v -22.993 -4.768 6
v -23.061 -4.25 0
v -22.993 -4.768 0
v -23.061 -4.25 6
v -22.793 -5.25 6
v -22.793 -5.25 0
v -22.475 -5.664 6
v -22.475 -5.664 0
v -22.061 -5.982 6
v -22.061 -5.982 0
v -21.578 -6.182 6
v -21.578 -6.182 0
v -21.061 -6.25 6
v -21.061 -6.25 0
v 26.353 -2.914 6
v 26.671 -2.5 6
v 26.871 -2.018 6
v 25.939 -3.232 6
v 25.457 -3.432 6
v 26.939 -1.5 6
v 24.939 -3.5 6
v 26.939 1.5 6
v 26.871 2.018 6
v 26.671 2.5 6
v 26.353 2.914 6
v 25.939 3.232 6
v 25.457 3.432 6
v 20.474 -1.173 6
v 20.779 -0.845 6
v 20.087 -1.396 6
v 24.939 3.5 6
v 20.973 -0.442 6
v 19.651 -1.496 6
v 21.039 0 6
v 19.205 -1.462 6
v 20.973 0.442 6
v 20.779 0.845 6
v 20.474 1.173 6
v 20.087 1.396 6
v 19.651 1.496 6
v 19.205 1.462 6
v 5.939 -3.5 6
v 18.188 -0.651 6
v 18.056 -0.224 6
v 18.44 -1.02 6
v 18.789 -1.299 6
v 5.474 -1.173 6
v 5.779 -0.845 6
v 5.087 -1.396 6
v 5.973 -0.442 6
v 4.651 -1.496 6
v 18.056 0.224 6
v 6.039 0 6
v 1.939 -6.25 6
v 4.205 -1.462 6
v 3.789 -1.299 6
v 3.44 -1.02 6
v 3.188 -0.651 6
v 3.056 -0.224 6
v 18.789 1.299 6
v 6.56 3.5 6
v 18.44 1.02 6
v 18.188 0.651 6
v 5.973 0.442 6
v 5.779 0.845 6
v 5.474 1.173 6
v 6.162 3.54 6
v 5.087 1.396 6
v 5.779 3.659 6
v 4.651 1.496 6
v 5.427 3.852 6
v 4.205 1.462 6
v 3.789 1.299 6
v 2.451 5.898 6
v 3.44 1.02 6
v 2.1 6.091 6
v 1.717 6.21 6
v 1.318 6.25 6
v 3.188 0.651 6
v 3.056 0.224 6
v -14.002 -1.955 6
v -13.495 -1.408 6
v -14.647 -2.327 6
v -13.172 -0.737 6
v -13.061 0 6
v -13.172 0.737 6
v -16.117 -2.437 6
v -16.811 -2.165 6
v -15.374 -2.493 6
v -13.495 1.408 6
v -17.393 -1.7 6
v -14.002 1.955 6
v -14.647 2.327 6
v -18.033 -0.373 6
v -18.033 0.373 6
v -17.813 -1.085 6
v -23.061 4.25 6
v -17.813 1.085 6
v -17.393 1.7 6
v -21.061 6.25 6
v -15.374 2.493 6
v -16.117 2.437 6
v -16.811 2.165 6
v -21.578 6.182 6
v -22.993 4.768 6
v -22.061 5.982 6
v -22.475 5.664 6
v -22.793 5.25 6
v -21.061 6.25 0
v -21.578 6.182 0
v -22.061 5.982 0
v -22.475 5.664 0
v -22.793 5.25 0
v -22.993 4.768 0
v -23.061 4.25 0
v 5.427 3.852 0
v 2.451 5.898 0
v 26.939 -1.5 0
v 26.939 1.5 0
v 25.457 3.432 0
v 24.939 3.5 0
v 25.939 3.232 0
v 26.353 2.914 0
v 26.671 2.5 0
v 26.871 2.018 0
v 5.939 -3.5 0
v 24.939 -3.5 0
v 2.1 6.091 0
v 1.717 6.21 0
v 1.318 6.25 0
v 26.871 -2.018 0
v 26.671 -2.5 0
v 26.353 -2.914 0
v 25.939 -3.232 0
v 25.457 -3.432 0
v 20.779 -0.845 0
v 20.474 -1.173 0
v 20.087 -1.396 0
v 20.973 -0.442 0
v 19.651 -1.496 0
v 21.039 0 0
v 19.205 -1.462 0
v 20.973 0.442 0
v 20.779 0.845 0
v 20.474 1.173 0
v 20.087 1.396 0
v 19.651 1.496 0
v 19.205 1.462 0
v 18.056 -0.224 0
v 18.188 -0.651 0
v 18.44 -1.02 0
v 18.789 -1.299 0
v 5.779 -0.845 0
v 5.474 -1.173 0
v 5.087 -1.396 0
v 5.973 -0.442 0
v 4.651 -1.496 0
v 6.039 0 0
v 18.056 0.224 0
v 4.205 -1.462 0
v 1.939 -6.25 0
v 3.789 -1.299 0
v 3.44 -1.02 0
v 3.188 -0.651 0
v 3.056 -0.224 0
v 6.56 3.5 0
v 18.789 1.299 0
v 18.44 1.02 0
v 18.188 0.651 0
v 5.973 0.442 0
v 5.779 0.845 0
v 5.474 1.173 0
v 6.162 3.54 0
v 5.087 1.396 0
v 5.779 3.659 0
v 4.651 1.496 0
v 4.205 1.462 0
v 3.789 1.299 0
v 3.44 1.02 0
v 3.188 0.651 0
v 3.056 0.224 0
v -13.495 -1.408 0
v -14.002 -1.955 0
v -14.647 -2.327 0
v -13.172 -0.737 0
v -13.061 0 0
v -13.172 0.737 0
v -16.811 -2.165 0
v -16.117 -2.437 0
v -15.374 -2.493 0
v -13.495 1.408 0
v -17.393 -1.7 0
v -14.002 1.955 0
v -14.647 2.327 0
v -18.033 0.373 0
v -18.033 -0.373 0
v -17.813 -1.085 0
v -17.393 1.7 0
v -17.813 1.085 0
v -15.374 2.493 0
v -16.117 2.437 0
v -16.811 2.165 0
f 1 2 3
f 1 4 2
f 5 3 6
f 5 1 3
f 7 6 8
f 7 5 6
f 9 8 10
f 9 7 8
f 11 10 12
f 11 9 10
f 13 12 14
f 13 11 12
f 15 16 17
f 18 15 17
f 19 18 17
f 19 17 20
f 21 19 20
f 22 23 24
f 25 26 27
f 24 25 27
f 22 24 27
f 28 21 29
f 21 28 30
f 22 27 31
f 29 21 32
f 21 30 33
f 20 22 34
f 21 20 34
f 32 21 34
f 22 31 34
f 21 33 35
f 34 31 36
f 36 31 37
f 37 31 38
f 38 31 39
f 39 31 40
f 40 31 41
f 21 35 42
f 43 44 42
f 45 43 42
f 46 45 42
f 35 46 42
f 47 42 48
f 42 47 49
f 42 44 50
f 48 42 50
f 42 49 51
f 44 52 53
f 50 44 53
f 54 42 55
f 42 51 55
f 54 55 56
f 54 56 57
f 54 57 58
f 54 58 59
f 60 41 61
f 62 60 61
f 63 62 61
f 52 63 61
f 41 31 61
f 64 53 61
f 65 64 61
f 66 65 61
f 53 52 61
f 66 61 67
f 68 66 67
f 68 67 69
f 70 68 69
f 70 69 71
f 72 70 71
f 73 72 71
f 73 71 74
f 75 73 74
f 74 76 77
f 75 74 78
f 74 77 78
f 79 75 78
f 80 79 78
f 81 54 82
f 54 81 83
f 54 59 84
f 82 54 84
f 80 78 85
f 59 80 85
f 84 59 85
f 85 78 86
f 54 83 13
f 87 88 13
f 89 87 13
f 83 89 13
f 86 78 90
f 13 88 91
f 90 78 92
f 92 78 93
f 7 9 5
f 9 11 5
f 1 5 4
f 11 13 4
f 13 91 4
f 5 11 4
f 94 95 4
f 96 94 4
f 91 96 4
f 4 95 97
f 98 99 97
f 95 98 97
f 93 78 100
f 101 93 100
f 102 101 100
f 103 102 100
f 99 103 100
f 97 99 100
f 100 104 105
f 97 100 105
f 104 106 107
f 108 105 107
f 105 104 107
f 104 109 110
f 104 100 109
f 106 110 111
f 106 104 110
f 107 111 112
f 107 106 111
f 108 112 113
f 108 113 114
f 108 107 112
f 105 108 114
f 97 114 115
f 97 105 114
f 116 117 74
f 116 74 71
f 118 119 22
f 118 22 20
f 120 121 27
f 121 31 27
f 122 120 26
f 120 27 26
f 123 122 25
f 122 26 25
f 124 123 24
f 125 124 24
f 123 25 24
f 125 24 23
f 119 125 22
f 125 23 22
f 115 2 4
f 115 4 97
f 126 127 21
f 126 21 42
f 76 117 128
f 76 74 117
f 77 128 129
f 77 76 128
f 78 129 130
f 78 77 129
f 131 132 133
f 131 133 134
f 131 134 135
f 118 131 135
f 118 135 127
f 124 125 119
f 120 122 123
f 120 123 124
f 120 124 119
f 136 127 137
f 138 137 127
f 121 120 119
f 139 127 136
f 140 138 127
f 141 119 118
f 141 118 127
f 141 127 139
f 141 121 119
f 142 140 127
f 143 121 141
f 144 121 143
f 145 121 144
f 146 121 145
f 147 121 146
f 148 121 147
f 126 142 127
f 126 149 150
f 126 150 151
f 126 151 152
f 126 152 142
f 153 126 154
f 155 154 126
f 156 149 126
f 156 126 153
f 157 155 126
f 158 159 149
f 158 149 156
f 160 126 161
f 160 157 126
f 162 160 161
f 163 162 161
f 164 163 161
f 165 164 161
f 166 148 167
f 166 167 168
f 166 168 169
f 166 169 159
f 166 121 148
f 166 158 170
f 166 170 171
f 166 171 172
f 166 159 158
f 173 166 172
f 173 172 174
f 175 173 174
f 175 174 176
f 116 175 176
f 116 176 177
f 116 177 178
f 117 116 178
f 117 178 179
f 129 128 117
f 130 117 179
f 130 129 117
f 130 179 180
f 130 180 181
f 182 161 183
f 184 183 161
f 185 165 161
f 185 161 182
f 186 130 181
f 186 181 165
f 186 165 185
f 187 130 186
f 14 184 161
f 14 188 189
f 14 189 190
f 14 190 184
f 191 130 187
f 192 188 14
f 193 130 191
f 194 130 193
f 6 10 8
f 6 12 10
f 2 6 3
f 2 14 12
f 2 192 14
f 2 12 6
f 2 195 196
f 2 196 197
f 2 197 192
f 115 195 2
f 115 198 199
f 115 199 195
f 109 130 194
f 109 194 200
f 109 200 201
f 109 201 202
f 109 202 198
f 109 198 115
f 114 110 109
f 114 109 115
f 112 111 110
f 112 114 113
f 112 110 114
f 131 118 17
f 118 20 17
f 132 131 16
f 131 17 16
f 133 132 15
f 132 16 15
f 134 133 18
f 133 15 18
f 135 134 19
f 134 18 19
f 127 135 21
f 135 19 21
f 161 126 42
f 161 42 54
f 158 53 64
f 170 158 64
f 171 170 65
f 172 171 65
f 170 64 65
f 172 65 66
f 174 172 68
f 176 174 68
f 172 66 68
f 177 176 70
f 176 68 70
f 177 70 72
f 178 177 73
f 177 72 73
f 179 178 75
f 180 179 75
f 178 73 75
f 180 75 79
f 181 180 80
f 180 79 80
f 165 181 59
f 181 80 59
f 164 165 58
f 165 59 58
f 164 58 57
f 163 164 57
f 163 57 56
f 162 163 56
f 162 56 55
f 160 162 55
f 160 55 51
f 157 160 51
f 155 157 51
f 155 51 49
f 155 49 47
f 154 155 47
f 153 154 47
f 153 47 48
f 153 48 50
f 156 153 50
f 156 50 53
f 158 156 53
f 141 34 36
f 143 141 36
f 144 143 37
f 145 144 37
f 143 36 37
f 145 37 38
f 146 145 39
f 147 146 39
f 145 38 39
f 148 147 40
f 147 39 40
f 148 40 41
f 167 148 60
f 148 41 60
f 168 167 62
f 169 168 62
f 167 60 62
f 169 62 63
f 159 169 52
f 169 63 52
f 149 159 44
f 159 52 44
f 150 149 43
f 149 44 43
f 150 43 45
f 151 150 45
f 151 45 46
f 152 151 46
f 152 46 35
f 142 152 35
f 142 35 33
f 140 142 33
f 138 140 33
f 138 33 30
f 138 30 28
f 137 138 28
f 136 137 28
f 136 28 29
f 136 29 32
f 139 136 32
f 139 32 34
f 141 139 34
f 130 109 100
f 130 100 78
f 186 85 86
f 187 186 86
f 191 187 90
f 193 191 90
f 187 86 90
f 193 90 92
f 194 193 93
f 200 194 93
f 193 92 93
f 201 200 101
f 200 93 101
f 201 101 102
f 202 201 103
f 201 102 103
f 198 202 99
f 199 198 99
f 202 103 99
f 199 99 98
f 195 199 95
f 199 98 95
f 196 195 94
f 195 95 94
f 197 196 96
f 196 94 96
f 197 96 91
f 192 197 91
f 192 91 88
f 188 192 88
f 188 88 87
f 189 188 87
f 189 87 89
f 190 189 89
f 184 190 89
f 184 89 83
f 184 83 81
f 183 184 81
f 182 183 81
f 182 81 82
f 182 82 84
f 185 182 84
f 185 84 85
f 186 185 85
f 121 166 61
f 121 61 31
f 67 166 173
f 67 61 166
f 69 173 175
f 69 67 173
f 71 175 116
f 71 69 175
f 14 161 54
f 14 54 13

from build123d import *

# Parameters (mm, degrees)
BOSS_EXTRU_1_DEPTH      = 6
ESQUISSE2_R             = 2.5
ESQUISSE2_R_2           = 1.5
ENL_V_MAT_EXTRU_1_DEPTH = 29.298078094
CONG_2_R                = 2


with BuildPart() as part:
    # Esquisse1 → Boss.-Extru.1 (new body)
    with BuildSketch(Plane.XY):
        Polygon((5.939167095, 3.5), (26.939167095, 3.5), (26.939167095, -3.5), (5.939167095, -3.5), (1.939167095, -6.25), (-23.060832905, -6.25), (-23.060832905, 6.25), (1.939167095, 6.25), align=None)
    extrude(amount=BOSS_EXTRU_1_DEPTH)

    # Esquisse2 → Enlèv. mat.-Extru.1 (cut, through all)
    with BuildSketch(Plane.XY.offset(6)):
        with Locations((-15.560832905, 0)):
            Circle(ESQUISSE2_R)
        with Locations((4.539167095, 0)):
            Circle(ESQUISSE2_R_2)
        with Locations((19.539167095, 0)):
            Circle(ESQUISSE2_R_2)
    extrude(amount=-ENL_V_MAT_EXTRU_1_DEPTH, mode=Mode.SUBTRACT)

    # Congé2
    cong_2_edges = [part.edges().sort_by_distance(p)[0] for p in [
        (-23.060832905, 6.25, 3),
        (1.939167095, 6.25, 3),
        (5.939167095, 3.5, 3),
        (26.939167095, 3.5, 3),
        (26.939167095, -3.5, 3),
        (-23.060832905, -6.25, 3),
    ]]
    fillet(cong_2_edges, radius=CONG_2_R)


solid = part.part
